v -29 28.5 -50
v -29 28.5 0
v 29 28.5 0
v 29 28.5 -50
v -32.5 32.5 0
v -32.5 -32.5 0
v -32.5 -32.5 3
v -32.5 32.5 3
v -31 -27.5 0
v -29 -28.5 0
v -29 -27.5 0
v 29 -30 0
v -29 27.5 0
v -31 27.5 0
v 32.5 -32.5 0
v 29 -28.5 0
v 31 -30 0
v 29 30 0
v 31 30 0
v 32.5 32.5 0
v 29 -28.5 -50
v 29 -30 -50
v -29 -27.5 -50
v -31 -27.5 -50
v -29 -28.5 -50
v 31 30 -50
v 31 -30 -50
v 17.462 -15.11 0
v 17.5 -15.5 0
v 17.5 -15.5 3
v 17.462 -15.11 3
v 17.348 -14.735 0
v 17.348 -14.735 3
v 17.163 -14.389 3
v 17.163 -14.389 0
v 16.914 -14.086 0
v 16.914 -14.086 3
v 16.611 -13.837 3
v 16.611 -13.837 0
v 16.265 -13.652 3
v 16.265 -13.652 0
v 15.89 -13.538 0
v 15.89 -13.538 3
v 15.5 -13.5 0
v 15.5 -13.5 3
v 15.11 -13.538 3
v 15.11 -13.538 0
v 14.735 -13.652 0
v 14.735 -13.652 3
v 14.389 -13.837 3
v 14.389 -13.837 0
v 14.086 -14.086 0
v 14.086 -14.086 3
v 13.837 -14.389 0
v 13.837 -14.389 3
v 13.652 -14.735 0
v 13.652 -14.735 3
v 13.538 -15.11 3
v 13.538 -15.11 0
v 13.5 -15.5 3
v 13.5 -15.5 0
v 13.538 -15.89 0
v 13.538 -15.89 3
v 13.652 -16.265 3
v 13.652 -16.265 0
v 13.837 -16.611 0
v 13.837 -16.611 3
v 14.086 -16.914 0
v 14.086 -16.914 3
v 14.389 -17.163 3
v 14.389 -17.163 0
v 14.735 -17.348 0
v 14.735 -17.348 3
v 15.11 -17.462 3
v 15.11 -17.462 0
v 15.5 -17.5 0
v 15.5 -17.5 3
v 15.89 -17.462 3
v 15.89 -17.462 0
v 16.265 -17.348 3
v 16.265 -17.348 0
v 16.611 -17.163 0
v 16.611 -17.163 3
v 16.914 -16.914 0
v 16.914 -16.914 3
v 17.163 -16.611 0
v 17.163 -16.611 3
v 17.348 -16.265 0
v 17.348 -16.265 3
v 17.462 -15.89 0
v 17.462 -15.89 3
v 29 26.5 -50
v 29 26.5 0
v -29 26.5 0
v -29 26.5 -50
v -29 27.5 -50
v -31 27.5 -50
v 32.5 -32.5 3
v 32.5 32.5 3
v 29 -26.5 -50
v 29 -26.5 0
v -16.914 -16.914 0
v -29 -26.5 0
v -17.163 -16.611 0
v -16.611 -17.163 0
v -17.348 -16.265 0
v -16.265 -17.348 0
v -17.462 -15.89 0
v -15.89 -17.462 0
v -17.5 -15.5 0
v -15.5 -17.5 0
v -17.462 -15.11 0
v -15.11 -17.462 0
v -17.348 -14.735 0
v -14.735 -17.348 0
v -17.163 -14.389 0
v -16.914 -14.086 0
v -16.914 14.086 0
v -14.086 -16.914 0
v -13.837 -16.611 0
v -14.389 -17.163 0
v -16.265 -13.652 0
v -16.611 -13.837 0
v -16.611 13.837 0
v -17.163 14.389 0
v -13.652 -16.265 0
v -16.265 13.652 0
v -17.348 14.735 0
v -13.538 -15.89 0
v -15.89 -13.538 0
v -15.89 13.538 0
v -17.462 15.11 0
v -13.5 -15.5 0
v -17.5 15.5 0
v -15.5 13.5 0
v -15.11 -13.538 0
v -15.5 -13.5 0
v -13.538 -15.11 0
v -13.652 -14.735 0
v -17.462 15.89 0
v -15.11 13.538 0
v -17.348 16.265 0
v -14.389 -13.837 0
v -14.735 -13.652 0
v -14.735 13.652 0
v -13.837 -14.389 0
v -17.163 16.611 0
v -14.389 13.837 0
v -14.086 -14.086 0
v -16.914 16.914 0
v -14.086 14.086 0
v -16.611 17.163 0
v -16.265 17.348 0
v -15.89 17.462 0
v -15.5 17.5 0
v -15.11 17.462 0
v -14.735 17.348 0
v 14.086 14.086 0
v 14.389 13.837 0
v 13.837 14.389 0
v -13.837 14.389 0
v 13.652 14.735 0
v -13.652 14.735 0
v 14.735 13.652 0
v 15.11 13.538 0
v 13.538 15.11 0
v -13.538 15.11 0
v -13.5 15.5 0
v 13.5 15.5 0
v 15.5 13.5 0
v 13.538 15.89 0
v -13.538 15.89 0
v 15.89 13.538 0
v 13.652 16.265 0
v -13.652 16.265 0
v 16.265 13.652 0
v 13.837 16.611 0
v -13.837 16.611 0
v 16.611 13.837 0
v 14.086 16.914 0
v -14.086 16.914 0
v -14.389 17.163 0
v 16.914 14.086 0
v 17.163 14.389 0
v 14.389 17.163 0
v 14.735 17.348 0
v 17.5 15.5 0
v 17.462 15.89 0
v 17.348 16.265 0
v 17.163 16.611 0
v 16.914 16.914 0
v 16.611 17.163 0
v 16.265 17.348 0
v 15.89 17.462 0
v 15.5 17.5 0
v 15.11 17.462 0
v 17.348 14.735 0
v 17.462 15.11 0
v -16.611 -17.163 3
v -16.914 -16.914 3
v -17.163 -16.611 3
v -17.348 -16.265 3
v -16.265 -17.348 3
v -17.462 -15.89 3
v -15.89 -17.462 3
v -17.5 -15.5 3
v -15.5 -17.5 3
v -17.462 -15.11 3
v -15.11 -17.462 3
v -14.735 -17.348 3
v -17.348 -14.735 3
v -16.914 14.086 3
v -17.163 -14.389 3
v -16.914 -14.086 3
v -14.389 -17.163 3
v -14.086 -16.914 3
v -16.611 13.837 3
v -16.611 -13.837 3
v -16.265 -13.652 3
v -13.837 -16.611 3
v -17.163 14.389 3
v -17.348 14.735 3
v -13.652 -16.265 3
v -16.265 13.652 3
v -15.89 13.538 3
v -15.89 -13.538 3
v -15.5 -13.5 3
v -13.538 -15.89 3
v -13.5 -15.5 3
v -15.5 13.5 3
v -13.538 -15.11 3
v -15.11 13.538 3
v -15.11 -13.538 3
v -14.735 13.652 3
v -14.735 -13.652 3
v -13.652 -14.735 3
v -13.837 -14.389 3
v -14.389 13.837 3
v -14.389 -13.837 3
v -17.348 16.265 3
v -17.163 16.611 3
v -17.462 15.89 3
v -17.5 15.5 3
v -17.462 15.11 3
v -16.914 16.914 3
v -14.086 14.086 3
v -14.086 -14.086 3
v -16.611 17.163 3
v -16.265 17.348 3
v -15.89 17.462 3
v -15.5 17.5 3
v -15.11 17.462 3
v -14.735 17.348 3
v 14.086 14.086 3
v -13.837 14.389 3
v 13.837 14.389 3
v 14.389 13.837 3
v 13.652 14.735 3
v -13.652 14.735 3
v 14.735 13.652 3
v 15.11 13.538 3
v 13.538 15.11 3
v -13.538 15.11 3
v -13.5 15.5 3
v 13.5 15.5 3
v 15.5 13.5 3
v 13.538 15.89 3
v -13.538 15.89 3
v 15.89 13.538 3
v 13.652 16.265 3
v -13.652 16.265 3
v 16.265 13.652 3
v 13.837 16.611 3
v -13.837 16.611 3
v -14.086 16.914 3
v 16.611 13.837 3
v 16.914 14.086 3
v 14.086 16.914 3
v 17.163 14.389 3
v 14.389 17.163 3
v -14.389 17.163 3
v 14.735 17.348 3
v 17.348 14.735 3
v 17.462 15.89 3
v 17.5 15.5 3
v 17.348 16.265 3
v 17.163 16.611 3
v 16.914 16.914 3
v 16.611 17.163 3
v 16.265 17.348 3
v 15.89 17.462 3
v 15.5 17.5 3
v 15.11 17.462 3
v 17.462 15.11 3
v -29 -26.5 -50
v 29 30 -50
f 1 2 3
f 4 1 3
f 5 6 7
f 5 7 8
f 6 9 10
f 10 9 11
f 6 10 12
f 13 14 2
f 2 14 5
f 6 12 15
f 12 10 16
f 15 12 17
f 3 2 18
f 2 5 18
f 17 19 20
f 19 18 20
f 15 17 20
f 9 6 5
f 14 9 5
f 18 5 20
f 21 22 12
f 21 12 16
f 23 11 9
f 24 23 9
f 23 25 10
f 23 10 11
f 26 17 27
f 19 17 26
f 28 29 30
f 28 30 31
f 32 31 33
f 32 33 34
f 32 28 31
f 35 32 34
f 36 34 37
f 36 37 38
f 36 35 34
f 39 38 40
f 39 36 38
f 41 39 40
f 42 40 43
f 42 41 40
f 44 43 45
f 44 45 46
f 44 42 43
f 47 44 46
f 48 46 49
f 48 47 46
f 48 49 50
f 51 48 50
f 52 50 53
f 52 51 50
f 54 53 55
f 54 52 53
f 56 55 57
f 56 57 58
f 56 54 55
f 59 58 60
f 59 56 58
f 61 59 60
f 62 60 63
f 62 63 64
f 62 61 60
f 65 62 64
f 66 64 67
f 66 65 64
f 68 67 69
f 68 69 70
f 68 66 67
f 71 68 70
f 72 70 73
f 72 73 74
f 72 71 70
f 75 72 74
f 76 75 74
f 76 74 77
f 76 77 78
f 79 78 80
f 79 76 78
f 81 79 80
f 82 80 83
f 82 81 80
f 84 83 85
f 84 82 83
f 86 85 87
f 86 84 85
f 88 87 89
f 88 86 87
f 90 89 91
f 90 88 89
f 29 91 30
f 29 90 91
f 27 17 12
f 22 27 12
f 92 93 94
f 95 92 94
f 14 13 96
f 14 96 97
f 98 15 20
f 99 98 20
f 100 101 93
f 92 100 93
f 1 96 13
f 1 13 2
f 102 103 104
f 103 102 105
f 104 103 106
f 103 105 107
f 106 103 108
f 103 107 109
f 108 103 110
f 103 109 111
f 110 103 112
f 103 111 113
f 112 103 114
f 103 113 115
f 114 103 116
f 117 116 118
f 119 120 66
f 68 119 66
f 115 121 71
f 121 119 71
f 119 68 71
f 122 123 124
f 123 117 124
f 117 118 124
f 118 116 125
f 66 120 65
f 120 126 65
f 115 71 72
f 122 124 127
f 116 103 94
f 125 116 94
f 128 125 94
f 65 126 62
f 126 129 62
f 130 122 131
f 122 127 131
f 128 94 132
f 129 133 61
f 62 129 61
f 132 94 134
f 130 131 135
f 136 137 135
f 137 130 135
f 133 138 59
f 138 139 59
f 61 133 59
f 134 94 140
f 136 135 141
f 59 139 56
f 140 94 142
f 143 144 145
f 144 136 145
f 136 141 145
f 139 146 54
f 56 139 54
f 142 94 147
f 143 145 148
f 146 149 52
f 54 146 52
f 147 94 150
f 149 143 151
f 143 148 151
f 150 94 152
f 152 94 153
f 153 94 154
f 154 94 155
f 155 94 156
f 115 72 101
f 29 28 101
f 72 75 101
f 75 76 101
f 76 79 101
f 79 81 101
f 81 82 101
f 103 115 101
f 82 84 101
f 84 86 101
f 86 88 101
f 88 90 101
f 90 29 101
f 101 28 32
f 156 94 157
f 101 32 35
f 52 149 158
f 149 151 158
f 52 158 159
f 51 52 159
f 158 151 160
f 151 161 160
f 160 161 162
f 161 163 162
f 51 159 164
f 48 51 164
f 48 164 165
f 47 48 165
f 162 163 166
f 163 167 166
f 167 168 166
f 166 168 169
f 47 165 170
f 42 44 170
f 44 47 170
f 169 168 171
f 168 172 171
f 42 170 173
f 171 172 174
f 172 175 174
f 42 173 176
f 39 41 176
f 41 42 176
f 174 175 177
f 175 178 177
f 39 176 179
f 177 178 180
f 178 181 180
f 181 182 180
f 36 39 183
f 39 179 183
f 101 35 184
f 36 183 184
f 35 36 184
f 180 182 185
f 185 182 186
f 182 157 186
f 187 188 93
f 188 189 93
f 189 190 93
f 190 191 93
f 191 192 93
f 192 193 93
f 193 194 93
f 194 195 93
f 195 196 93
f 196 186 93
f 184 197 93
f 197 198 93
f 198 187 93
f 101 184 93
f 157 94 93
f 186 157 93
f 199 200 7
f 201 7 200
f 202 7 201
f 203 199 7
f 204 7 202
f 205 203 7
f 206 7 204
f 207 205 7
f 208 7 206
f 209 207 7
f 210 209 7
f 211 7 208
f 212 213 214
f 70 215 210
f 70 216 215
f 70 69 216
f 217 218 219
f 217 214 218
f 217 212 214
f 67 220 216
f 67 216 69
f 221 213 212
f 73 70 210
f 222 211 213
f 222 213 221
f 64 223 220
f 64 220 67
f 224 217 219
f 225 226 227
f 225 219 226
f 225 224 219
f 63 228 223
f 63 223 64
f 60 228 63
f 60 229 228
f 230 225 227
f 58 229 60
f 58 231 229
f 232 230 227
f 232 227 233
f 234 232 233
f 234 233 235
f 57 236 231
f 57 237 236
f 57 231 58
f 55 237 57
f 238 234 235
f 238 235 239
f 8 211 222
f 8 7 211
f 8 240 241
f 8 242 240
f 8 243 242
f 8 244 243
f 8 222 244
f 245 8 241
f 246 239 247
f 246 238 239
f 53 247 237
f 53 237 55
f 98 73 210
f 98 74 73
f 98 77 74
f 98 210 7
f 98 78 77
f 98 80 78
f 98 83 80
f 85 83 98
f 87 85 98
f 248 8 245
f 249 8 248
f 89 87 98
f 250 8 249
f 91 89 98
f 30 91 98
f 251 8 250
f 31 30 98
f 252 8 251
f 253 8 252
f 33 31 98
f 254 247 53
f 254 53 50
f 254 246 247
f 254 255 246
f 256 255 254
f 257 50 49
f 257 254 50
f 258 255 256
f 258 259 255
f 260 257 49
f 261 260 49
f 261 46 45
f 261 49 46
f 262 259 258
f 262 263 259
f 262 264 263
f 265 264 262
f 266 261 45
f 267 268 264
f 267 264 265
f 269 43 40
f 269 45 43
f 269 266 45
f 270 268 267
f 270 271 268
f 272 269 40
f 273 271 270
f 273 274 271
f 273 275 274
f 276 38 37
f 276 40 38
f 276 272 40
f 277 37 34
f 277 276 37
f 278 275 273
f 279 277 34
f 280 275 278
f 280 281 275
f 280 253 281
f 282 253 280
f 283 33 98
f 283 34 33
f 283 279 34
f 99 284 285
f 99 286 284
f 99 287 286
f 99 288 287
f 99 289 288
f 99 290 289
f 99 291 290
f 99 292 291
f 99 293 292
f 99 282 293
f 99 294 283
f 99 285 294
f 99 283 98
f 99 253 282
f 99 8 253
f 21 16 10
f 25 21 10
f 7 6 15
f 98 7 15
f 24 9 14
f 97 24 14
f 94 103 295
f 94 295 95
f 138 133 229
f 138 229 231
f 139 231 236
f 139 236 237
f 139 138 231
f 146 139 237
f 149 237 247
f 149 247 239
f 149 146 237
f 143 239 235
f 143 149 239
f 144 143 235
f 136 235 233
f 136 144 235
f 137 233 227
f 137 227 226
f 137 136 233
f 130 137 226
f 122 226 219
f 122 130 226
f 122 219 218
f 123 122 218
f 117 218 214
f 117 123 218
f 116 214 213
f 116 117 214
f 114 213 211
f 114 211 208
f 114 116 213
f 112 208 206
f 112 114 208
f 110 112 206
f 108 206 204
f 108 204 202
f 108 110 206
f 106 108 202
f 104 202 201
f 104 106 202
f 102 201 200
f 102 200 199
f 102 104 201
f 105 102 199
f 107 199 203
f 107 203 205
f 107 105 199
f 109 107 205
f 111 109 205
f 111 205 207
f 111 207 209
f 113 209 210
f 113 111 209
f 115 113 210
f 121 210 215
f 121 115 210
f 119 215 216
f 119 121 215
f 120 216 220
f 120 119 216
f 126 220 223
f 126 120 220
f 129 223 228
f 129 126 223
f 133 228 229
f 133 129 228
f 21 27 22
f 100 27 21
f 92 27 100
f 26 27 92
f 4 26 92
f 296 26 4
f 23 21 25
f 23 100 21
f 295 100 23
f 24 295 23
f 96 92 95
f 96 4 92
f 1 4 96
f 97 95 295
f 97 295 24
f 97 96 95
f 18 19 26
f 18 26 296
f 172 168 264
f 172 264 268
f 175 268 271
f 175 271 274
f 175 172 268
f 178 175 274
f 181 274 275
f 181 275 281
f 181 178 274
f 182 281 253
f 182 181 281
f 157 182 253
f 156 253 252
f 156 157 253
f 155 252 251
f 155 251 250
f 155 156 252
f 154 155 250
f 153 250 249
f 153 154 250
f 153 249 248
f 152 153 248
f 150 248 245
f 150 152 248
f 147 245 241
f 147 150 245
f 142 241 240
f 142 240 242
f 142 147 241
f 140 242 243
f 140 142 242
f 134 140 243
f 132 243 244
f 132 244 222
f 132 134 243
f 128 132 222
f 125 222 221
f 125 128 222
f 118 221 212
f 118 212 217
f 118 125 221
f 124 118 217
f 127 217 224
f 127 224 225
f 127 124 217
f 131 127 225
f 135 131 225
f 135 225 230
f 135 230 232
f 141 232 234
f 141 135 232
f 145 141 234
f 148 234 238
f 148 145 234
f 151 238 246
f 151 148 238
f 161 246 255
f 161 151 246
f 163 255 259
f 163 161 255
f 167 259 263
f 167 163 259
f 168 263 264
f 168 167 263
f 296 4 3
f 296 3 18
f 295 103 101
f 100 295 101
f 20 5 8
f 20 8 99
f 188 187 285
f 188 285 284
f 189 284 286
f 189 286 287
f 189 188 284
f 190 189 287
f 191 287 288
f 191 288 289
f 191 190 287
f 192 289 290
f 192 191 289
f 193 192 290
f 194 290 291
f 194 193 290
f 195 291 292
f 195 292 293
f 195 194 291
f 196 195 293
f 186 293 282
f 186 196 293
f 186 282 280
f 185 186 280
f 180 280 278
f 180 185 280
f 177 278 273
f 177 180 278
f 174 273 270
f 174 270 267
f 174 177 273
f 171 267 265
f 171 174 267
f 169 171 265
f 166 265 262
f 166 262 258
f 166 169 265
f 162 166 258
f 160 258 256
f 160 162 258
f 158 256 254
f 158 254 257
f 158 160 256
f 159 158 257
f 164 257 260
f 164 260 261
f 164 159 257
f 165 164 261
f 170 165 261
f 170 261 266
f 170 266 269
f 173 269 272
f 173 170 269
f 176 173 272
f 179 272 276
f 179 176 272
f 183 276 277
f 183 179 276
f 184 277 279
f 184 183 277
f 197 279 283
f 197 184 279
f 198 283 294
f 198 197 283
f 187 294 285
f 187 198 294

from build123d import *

# Parameters (mm, degrees)
SKETCH1_W           = 65
SKETCH1_H           = 65
SKETCH1_R           = 2
BOSS_EXTRUDE1_DEPTH = 3
SKETCH4_W           = 2
SKETCH4_H           = 60
SKETCH4_H_2         = 55
BOSS_EXTRUDE3_DEPTH = 50


with BuildPart() as part:
    # Sketch1 → Boss-Extrude1 (new body)
    with BuildSketch(Plane.XY):
        Rectangle(SKETCH1_W, SKETCH1_H)
        with Locations((-15.5, 15.5)):
            Circle(SKETCH1_R, mode=Mode.SUBTRACT)
        with Locations((15.5, 15.5)):
            Circle(SKETCH1_R, mode=Mode.SUBTRACT)
        with Locations((15.5, -15.5)):
            Circle(SKETCH1_R, mode=Mode.SUBTRACT)
        with Locations((-15.5, -15.5)):
            Circle(SKETCH1_R, mode=Mode.SUBTRACT)
    extrude(amount=BOSS_EXTRUDE1_DEPTH)

    # Sketch4 → Boss-Extrude3 (add)
    with BuildSketch(Plane(origin=(0, 0, 0), x_dir=(-1, 0, 0), z_dir=(0, 0, -1))):
        with Locations((-30, 0)):
            Rectangle(SKETCH4_W, SKETCH4_H)
        Polygon((29, -26.5), (-29, -26.5), (-29, -28.5), (29, -28.5), (29, -27.5), align=None)
        with Locations((30, 0)):
            Rectangle(SKETCH4_W, SKETCH4_H_2)
        Polygon((29, 27.5), (29, 28.5), (-29, 28.5), (-29, 26.5), (29, 26.5), align=None)
    extrude(amount=BOSS_EXTRUDE3_DEPTH)


solid = part.part
